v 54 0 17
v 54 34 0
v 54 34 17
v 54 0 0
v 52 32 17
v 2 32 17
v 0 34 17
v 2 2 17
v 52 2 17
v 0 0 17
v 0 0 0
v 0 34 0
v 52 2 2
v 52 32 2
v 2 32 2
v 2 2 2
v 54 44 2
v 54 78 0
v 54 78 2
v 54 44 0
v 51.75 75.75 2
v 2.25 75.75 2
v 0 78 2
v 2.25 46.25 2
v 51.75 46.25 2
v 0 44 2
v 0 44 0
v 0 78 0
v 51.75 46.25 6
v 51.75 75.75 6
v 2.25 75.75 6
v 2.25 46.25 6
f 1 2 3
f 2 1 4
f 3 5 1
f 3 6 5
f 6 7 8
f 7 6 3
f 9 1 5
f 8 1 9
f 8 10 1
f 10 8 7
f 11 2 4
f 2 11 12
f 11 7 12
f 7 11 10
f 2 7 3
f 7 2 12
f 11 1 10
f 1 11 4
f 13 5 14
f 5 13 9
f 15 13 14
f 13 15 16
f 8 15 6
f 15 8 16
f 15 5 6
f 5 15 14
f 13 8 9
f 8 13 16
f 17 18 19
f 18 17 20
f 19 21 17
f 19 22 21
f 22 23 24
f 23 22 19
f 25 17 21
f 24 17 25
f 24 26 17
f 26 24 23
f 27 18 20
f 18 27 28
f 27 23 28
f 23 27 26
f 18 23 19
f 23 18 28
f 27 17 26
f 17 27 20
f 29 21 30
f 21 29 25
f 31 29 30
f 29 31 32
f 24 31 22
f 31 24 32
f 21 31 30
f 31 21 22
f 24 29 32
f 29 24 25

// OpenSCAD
// Box with a press-fit lid - a hollow rectangular box (open top) and a separate lid whose plug
// drops into the opening. The two parts are laid side by side. NOVEL general part.
//
// @desc hollow box with a separate press-fit lid
// @prompt Design a small box with a lid in OpenSCAD: an inner space {il} by {iw} by {ih} mm with {wall} mm walls, and a separate lid whose plug drops {lip} mm into the opening. Lay the two parts side by side. Reply with a single complete OpenSCAD file.
// @param il   inner length, mm     [20:80]
// @param iw   inner width, mm      [20:60]
// @param ih   inner height, mm     [10:50]
// @param wall wall thickness, mm   [1.6:4]
// @param lip  lid plug depth, mm   [3:10]

il   = 50;
iw   = 30;
ih   = 15;
wall = 2;
lip  = 4;

$fn = 32;

ol = il + 2 * wall;
ow = iw + 2 * wall;

module box() {
    difference() {
        cube([ol, ow, ih + wall]);
        translate([wall, wall, wall]) cube([il, iw, ih + 1]);   // open-top cavity
    }
}

module lid() {
    cl = il - 0.5;                 // plug: 0.25 mm clearance per side
    cw = iw - 0.5;
    union() {
        cube([ol, ow, wall]);                                    // top plate, full footprint
        translate([(ol - cl) / 2, (ow - cw) / 2, 0])
            cube([cl, cw, wall + lip]);                          // plug (overlaps the plate -> one solid)
    }
}

box();
translate([0, ow + 10, 0]) lid();
